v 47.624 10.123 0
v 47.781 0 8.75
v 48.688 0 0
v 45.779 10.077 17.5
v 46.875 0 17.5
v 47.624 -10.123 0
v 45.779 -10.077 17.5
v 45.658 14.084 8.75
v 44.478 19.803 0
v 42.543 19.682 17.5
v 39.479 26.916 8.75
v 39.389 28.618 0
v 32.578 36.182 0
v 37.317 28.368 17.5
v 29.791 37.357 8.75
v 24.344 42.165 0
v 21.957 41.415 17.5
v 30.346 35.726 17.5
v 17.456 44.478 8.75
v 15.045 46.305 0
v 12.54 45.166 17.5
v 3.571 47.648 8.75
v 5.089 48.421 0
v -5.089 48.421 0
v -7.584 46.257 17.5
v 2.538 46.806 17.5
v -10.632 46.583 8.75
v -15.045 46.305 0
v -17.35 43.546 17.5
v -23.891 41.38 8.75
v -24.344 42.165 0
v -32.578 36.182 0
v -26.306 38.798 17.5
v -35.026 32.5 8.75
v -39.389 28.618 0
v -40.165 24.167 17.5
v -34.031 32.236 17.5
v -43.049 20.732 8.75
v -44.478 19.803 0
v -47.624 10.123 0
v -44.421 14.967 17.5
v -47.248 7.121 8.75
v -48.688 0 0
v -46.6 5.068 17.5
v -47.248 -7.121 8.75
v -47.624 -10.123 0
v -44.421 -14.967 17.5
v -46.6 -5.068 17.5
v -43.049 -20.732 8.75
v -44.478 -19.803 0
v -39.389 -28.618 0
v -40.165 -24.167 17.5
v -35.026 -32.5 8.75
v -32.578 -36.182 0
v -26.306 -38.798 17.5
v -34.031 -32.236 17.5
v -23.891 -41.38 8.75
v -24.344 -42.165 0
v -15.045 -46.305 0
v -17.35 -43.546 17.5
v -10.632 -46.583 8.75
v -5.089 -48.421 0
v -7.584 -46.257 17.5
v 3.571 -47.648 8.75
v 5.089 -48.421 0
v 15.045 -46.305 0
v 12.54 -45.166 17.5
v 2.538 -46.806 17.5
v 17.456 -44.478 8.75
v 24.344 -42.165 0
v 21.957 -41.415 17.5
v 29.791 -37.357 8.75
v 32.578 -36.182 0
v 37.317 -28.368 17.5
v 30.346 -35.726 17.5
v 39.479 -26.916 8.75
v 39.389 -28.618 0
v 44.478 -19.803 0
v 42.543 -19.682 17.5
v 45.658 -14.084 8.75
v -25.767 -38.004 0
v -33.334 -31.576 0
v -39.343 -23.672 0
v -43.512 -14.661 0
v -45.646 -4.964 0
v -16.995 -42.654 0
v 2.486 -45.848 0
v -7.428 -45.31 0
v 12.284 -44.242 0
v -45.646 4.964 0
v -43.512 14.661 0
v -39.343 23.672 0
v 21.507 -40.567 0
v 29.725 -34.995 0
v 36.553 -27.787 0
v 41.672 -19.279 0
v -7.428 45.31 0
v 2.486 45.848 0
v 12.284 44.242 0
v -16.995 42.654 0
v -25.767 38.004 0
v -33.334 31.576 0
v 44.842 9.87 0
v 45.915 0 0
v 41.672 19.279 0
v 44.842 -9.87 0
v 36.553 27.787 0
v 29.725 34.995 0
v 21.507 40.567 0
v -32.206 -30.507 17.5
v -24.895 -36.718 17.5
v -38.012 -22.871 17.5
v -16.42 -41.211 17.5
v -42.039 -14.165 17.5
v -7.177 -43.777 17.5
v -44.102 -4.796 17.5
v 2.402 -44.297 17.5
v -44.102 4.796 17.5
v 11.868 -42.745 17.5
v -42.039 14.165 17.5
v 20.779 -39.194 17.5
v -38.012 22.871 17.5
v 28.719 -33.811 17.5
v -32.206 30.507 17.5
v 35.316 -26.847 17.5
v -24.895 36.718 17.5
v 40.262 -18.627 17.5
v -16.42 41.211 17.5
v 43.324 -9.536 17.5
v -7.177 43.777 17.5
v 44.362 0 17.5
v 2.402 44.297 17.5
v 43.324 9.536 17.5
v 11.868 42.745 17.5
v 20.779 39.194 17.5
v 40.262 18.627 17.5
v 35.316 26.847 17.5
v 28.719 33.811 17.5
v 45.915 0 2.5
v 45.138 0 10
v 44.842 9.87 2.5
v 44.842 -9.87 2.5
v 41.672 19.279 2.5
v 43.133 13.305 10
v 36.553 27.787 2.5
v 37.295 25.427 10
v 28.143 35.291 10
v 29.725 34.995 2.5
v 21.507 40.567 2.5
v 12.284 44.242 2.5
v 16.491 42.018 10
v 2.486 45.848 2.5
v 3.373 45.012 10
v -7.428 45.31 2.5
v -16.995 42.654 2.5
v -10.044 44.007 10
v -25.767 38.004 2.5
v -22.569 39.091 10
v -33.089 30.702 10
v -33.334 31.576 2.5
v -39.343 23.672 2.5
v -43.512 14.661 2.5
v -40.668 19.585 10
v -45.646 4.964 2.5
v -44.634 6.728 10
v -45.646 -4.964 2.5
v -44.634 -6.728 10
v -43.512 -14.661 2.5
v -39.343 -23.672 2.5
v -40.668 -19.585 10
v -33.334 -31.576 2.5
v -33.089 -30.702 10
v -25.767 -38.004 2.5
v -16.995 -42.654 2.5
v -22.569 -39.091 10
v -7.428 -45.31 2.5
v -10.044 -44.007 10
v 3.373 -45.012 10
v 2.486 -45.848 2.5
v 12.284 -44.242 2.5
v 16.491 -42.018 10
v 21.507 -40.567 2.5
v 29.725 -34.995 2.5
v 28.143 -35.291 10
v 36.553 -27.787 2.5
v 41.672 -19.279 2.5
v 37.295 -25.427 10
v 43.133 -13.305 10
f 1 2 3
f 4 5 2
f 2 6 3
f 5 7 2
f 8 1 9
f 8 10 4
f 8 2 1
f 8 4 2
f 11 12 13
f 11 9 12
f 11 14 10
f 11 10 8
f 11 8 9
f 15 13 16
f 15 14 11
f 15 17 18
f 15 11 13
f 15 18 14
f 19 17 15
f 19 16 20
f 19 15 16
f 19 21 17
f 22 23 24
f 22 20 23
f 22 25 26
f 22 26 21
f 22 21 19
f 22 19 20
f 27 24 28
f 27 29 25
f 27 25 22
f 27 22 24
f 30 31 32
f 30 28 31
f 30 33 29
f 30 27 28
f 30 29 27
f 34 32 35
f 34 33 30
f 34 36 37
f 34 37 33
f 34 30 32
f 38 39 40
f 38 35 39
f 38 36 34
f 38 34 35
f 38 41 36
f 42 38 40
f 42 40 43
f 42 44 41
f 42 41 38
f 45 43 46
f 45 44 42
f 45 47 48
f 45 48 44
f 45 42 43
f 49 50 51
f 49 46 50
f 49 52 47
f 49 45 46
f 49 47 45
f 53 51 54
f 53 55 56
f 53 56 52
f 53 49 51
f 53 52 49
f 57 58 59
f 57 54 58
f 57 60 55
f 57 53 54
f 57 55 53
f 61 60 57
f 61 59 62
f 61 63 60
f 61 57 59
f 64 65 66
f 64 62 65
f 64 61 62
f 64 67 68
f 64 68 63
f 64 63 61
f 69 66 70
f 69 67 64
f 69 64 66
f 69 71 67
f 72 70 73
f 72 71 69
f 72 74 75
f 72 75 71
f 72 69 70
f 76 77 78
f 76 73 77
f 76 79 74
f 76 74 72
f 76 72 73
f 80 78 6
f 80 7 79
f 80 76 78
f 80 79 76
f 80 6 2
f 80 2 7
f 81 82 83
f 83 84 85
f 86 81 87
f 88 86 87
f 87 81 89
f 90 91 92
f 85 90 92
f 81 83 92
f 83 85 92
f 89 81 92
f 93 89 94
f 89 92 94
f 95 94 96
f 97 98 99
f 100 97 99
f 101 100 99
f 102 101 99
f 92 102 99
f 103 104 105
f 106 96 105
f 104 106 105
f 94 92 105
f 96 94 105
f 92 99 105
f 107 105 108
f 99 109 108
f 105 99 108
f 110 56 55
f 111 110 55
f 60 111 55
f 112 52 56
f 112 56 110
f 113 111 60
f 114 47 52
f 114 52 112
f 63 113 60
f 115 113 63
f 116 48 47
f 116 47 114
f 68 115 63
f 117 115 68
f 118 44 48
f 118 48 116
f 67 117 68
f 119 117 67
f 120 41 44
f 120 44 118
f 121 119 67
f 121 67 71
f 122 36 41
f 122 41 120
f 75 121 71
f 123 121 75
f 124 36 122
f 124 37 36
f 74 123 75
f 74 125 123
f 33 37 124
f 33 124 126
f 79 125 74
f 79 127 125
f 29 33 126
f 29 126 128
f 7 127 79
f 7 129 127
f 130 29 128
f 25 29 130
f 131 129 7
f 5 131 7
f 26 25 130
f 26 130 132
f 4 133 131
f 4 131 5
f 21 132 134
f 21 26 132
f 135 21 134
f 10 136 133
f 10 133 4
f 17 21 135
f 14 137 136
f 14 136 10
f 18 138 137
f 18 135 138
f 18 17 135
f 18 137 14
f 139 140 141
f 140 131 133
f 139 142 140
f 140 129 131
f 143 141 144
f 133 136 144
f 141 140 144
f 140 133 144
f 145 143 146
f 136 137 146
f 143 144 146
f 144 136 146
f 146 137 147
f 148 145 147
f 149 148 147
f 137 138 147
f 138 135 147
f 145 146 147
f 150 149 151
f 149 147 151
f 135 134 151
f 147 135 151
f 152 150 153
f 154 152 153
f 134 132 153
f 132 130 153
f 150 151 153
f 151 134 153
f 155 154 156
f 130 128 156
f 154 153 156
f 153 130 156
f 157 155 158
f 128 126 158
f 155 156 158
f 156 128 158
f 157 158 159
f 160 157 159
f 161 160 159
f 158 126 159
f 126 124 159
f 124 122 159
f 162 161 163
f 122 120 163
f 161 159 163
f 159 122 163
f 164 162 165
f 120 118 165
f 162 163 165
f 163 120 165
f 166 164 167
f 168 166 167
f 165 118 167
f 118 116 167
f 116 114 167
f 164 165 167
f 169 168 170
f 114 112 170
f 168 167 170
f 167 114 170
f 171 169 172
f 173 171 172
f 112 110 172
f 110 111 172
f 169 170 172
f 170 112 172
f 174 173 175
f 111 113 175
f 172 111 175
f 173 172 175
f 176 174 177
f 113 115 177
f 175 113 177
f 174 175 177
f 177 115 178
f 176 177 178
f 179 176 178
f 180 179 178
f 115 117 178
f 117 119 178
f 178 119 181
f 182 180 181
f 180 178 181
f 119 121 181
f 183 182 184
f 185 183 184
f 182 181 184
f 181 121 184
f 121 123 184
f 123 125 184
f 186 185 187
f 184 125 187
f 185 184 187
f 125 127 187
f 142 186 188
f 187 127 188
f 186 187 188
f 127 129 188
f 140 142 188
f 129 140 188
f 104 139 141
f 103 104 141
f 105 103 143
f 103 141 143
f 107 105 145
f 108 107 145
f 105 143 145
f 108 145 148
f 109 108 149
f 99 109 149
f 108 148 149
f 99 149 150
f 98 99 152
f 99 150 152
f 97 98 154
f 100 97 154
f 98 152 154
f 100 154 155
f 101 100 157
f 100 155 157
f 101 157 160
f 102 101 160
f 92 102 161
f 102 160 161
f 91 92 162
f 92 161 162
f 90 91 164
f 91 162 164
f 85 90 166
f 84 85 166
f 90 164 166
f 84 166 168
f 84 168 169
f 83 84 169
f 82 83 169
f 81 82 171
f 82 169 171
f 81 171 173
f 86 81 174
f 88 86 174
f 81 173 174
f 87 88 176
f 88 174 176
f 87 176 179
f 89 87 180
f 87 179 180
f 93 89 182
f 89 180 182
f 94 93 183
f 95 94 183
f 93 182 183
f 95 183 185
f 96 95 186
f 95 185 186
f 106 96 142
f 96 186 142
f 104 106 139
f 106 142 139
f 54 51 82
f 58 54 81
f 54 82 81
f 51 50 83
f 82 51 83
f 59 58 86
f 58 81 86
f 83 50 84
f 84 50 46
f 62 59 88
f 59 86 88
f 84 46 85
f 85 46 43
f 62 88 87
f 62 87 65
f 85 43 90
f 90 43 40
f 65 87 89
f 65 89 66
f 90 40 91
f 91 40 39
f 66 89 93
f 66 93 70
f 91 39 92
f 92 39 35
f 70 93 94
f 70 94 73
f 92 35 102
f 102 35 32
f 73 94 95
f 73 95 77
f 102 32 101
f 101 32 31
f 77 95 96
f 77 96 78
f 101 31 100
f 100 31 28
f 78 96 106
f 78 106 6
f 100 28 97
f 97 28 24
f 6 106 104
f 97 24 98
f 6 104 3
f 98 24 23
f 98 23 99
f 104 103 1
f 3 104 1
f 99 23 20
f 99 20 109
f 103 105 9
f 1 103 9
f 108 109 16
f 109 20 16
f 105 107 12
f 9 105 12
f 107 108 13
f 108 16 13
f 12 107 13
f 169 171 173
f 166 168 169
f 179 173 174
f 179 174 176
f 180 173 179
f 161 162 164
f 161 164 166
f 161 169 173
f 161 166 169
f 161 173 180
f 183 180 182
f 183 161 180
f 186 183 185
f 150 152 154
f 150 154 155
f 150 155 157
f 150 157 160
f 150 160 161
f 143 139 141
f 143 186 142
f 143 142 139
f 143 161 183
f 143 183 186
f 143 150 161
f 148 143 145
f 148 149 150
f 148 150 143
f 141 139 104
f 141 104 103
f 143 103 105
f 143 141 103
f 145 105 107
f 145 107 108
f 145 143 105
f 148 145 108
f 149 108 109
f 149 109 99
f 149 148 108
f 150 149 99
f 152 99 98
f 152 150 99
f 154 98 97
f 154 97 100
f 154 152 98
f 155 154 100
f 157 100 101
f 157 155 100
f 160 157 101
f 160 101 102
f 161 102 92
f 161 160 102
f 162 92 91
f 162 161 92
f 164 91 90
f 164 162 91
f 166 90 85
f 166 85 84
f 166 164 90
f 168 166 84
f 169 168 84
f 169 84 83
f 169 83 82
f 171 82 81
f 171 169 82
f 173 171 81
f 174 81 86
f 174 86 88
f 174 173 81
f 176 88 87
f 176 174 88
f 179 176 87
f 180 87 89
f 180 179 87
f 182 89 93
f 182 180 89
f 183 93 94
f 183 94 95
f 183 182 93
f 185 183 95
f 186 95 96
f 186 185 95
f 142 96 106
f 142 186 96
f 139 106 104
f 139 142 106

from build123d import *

# Parameters (mm, degrees)
F8_R      = 48.6875
F9_DEPTH  = 17.5
F9_TAPER  = 5.9131224442
F10_T     = -2.5
F11_R     = 45.9151983952
F12_DEPTH = 2.5
F13_DEPTH = 2.5


with BuildPart() as f9:
    # F8 (on Top) → F9 (new body)
    with BuildSketch(Plane.XY):
        Circle(F8_R)
    extrude(amount=F9_DEPTH, taper=F9_TAPER)

    # F10
    f10_openings = [f9.faces().sort_by_distance(p)[0] for p in [
        (0, 0, 17.5),
    ]]
    offset(amount=F10_T, openings=f10_openings)

    # F11 (on face) → F12 (cut, through all)
    with BuildSketch(Plane.XY.offset(2.5)):
        Circle(F11_R)
    extrude(amount=-F12_DEPTH, mode=Mode.SUBTRACT)


with BuildPart() as f13:
    # F11 (on face) → F13 (new body, through all)
    with BuildSketch(Plane.XY.offset(2.5)):
        Circle(F11_R)
    extrude(amount=-F13_DEPTH)


solid = Compound([f9.part, f13.part])
